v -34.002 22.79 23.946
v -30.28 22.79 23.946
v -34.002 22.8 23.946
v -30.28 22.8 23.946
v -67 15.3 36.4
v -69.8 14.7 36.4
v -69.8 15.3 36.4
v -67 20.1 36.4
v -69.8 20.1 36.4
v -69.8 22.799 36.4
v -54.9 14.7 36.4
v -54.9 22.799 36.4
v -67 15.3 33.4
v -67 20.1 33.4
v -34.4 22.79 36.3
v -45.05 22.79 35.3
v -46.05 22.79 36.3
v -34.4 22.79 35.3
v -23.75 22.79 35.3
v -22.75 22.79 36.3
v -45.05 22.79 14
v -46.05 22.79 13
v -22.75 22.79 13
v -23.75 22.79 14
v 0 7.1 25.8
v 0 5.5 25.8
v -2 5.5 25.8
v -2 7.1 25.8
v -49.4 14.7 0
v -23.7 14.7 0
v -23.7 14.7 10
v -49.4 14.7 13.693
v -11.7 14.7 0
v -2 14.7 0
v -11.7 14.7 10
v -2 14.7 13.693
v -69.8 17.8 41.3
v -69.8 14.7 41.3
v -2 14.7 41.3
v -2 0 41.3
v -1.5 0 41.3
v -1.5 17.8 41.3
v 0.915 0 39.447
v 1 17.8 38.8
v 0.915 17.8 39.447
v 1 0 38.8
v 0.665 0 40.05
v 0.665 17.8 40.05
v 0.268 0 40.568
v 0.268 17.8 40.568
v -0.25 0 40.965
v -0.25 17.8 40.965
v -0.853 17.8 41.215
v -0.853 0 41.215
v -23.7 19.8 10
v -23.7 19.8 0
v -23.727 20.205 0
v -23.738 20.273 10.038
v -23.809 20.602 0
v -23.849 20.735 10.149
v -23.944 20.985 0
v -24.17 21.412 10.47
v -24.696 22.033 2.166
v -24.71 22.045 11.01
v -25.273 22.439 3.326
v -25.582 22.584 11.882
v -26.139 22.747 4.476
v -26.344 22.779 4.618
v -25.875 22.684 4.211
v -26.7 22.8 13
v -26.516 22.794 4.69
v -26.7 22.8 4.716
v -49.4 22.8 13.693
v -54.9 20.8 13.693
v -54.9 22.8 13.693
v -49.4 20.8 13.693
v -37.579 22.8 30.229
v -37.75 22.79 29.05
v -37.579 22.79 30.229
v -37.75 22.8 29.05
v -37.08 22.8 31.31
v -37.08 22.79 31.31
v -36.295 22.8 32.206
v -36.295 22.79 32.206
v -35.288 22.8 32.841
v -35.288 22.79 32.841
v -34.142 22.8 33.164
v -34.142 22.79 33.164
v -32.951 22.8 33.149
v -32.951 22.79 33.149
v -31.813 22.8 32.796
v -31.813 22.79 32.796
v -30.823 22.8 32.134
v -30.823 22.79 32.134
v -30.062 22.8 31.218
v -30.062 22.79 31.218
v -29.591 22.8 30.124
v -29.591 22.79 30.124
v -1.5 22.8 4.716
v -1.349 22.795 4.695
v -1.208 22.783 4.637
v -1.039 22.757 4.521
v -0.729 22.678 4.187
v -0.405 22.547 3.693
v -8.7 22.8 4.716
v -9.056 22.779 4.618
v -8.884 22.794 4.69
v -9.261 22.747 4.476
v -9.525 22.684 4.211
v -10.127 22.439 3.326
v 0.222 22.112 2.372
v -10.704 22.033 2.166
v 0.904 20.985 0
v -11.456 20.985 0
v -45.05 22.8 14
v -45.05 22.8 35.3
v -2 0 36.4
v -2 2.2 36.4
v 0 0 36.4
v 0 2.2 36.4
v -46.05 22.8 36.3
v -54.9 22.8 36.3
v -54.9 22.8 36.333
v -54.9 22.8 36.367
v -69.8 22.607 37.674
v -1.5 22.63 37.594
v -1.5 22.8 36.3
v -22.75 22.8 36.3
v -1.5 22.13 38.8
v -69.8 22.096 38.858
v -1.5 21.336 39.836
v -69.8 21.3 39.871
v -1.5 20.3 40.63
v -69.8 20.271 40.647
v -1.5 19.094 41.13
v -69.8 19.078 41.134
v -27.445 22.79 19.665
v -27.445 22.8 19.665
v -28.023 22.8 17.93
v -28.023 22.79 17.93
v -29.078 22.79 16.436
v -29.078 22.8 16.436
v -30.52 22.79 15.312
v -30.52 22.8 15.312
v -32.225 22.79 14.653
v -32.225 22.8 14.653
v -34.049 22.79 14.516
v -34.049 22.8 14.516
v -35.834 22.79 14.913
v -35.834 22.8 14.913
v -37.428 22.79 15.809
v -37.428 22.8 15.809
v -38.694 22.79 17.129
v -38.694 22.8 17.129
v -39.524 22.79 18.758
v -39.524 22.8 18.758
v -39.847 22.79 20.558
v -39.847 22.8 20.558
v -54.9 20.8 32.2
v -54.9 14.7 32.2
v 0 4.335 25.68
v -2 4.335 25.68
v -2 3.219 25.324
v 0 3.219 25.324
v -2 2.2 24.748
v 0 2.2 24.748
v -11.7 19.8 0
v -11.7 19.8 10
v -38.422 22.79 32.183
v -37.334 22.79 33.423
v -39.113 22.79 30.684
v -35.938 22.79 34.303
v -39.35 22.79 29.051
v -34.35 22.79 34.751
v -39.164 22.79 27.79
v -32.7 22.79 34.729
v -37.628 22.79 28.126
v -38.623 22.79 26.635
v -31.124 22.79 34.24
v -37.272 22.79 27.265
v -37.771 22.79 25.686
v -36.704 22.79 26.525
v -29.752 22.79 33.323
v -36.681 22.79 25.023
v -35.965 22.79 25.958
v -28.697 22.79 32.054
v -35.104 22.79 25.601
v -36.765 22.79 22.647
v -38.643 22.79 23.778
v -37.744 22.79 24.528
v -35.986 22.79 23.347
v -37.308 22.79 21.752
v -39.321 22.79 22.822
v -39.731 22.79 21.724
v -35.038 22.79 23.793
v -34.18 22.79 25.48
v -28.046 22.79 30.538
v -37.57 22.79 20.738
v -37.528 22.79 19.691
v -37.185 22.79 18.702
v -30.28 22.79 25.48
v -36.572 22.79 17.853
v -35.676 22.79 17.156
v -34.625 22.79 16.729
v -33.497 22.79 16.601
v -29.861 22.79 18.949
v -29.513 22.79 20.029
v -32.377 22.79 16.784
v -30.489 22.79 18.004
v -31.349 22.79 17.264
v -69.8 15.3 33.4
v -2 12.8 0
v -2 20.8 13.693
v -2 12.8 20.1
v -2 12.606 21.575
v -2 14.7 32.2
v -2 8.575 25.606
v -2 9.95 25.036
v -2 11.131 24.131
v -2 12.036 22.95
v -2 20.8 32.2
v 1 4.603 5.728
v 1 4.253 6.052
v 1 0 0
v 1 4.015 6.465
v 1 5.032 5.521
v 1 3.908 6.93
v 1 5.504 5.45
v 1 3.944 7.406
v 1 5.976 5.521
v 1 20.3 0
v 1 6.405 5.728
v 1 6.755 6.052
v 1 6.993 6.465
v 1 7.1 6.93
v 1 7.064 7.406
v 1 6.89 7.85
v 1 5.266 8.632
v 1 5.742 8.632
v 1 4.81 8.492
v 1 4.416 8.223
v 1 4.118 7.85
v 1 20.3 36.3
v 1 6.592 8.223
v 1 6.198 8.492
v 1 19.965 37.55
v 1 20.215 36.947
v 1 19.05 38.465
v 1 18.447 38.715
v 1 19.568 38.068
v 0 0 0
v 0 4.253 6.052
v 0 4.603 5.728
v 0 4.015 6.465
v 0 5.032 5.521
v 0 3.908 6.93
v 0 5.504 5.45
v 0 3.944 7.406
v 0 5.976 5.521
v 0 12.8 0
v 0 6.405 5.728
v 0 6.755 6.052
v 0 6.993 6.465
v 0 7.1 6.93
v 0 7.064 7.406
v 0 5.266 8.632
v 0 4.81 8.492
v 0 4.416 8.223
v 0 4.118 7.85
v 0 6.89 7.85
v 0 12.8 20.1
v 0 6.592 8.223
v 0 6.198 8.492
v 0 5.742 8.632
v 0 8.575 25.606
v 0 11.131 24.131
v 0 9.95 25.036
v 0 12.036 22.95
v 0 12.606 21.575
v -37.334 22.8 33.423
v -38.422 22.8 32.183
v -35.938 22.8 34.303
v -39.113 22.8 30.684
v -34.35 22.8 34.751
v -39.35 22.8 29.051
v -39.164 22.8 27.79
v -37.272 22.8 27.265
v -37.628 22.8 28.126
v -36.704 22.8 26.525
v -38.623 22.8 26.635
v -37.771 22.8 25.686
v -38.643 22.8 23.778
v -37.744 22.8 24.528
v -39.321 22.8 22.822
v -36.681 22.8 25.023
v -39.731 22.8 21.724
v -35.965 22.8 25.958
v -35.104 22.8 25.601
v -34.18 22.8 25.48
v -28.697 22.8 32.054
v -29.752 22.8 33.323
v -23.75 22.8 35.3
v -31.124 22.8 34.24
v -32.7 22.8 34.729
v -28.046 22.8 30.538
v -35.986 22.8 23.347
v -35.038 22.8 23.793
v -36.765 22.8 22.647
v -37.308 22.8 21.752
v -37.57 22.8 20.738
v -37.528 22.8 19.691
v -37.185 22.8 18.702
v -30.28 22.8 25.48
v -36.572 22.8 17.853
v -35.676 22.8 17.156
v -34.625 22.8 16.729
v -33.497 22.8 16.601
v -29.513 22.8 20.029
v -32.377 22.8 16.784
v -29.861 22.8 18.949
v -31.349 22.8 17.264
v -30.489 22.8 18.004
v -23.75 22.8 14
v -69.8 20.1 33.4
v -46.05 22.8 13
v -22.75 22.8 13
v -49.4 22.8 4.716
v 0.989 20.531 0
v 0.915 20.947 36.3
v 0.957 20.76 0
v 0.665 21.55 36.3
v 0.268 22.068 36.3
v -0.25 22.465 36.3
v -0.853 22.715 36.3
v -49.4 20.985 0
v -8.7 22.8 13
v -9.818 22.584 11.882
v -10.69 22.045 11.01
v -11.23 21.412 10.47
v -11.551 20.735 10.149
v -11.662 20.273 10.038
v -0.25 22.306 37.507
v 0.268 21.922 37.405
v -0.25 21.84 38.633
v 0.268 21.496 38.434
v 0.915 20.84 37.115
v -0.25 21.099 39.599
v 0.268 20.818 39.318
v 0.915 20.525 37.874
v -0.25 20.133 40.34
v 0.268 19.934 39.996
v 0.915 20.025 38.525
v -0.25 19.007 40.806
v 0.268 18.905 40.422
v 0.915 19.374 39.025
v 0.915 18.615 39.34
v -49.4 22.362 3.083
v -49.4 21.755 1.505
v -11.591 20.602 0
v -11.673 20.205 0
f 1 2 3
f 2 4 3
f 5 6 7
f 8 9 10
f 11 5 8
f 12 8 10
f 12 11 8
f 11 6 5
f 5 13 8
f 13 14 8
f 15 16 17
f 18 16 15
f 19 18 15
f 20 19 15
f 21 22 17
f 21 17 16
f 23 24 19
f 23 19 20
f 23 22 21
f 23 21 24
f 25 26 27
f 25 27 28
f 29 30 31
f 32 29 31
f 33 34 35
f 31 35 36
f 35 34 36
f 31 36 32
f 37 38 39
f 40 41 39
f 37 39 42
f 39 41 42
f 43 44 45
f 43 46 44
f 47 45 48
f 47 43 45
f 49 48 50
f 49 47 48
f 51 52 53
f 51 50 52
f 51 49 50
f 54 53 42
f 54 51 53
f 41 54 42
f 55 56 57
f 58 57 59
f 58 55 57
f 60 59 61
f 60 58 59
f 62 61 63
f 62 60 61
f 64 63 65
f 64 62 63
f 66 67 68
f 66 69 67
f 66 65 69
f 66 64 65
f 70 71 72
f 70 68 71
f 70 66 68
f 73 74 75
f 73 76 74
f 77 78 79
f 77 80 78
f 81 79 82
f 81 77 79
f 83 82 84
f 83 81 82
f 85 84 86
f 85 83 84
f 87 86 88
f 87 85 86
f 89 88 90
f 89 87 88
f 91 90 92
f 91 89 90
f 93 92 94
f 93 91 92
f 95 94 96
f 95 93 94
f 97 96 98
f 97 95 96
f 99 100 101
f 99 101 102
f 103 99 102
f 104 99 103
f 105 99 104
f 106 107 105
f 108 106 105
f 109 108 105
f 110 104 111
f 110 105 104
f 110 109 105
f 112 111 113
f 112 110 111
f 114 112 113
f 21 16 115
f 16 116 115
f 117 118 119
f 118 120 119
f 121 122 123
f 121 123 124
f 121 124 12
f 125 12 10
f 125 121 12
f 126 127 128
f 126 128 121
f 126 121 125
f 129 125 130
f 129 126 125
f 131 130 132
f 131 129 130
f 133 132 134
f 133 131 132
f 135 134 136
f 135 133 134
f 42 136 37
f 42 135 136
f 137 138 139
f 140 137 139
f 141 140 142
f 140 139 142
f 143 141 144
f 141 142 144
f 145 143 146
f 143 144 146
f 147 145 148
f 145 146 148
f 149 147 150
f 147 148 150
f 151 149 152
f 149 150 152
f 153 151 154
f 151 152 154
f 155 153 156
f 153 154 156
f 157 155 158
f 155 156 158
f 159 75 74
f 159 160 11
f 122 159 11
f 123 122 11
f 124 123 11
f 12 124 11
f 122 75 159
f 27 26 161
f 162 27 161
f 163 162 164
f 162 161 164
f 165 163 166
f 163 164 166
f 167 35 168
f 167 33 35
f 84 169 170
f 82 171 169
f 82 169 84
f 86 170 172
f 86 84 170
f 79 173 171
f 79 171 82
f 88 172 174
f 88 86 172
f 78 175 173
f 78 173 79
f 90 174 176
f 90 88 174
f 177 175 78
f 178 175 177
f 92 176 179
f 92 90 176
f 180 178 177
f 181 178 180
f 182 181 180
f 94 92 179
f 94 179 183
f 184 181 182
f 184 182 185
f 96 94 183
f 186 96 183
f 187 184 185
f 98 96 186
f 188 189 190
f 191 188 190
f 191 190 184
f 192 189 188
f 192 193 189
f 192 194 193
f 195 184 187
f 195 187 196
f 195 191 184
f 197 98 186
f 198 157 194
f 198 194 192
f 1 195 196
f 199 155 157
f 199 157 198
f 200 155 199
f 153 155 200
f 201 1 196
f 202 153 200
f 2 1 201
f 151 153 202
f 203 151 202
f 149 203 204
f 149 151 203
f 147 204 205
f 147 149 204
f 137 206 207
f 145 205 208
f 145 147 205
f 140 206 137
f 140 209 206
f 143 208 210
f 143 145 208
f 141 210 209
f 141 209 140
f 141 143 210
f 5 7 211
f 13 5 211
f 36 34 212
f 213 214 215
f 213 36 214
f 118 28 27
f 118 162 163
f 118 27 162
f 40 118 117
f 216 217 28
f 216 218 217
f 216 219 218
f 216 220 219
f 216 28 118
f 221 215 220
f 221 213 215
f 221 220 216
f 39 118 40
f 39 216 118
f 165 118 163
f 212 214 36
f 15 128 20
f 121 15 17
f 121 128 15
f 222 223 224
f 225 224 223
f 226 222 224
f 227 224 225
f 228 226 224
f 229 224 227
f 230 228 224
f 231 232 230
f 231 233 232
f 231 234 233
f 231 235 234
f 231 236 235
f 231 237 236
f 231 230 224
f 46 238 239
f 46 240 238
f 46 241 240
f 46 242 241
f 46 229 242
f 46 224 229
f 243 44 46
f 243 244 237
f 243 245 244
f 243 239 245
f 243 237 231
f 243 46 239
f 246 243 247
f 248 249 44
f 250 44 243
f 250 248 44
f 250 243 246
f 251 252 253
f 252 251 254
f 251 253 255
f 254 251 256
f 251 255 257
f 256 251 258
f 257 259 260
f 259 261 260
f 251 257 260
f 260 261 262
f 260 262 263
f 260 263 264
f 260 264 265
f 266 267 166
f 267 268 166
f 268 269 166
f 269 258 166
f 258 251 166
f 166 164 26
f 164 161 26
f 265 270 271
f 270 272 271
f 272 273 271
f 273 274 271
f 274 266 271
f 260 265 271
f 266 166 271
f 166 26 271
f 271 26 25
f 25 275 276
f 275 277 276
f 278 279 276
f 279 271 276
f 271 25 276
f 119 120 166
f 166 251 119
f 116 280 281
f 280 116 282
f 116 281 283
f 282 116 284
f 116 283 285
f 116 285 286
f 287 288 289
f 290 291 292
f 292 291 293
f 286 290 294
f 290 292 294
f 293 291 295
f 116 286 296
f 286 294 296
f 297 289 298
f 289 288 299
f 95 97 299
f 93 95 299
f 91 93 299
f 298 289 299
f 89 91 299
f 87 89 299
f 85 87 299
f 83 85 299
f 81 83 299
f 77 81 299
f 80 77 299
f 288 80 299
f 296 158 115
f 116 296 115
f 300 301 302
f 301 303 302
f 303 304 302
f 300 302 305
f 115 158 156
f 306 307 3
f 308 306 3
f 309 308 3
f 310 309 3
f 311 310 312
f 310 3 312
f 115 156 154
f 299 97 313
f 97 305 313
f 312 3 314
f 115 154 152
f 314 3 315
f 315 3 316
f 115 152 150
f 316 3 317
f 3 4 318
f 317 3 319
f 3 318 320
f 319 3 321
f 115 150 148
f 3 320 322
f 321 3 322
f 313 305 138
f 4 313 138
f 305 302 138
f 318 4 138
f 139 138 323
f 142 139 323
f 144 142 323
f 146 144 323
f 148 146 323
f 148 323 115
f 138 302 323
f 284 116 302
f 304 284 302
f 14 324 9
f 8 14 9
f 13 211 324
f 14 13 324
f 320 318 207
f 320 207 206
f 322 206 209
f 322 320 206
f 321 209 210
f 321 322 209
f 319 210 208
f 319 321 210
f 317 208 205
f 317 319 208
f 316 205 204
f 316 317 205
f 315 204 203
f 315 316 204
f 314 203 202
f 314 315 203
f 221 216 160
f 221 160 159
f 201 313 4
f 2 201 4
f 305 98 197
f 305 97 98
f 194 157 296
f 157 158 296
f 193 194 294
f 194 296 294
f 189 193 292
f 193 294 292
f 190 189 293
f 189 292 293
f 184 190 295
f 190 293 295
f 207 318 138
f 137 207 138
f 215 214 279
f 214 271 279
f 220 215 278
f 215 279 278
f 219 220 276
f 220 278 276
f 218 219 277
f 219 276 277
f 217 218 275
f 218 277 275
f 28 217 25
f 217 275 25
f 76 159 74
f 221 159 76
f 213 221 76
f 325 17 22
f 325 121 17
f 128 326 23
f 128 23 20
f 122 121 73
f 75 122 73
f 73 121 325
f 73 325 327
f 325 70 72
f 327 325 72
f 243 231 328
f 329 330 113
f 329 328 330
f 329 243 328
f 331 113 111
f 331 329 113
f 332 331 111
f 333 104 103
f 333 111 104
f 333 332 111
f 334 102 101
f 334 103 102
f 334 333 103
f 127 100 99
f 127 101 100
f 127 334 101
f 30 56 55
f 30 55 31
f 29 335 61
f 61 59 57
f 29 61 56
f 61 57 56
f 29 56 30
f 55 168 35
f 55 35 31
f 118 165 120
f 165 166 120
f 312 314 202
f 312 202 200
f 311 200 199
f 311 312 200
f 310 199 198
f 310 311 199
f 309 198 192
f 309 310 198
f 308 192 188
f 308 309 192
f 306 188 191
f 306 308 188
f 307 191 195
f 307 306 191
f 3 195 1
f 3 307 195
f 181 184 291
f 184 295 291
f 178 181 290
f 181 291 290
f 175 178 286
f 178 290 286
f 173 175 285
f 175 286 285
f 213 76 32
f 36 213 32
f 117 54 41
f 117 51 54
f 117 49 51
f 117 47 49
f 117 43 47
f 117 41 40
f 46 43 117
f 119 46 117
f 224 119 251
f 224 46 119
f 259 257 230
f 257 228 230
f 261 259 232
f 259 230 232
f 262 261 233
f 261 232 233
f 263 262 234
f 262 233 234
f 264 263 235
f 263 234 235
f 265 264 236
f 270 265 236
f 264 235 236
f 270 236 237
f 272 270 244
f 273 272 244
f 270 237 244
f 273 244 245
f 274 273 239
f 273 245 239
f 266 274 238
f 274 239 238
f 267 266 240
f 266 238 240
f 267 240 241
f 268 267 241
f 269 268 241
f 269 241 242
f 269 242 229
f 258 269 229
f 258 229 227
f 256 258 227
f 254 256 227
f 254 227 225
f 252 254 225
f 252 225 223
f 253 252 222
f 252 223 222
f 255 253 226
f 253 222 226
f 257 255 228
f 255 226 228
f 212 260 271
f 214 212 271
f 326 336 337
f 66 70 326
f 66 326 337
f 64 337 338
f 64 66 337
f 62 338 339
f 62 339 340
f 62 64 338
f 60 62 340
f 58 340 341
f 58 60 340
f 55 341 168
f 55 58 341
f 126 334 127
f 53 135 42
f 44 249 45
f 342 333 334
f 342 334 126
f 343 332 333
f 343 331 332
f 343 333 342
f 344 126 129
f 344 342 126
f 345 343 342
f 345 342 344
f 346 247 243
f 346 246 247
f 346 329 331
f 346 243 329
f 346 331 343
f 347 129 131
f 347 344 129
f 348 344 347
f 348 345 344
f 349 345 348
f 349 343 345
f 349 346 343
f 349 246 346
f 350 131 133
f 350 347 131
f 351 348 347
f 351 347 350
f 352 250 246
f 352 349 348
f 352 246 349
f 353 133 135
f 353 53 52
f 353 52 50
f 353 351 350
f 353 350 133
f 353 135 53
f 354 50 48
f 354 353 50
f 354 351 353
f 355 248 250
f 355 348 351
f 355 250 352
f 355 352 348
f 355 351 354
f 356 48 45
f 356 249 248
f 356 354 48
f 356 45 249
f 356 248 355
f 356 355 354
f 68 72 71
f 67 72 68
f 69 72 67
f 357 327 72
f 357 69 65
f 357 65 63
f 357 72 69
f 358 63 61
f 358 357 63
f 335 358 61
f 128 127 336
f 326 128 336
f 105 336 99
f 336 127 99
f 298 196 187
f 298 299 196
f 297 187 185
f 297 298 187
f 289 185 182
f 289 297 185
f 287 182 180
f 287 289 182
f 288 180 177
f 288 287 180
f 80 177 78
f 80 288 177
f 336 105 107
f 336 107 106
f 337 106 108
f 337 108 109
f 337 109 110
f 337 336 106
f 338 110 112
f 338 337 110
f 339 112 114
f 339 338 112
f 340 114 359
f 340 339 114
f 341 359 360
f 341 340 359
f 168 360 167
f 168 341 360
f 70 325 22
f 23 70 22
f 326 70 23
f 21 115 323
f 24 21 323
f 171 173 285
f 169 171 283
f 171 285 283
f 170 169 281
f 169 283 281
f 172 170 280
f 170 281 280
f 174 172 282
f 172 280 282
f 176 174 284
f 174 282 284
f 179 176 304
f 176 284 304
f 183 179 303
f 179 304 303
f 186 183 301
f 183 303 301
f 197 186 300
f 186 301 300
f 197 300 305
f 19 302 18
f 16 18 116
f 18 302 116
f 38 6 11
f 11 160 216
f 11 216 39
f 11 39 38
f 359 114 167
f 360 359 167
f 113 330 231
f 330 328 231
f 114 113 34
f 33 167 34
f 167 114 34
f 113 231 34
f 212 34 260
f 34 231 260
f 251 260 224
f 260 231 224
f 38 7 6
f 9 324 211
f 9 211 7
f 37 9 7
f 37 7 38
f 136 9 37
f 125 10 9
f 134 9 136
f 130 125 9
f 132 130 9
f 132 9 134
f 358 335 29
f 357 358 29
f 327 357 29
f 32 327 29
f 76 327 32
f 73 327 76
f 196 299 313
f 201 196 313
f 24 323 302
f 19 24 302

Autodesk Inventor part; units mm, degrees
ref_plane "YZ Plane" through (0, 0, 0) normal (1, 0, 0) x (0, 1, 0)
sketch "スケッチ1" plane through (0, 0, 0) normal (1, 0, 0) x (0, 1, 0)
  line L0 (0, 0) -> (22.8, 0)
  line L1 (22.8, 0) -> (22.8, 41.3)
  line L2 (22.8, 41.3) -> (0, 41.3)
  line L3 (0, 41.3) -> (0, 0)
  arc A0 (2, -7.1682) -> (22.8, 4.7165) centre (7.1, 8.05) ccw projected
  line L4 (22.8, 36.2) -> (22.8, 4.7165) projected
  line L5 (22.8, 36.2) -> (12.6, 36.2) projected
  line L6 (12.6, 36.2) -> (12.6, 28.2) projected
  line L7 (14.2, 28.2) -> (12.6, 28.2) projected
  line L8 (14.2, 28.2) -> (14.2, 32.2) projected
  line L9 (14.2, 32.2) -> (20.8, 32.2) projected
  line L10 (20.8, 32.2) -> (20.8, 8.3) projected
  line L11 (14.2, 8.3) -> (20.8, 8.3) projected
  line L12 (14.2, 4.7954) -> (14.2, 8.3) projected
  line L13 (14.2, 0) -> (14.2, 4.7954) projected
  line L14 (2, 0) -> (14.2, 0) projected
  line L15 (2, 0) -> (2, -7.1682) projected
  line L16 (12.6, 42.3) -> (14.6, 42.3) projected
  dimension "d2" = 1
extrude "押し出し1" add sketch "スケッチ1" along normal blind 1 contours L3 L2 L1 L5 L6 L7 L8 L9 L10 L11 L12 L13 L0 | L13 L12 L11 L10 L9 L8 L7 L6 L5 L1 A0 L0 | A0 L1 L0
sketch "スケッチ2" plane through (0, 0, 0) normal (-1, 0, 0) x (0, 0, 1)
  line L0 (24.3426, 2) -> (36.2, 2)
  line L1 (36.2, 0) -> (36.2, 2)
  arc A0 (25.6, 7.1) -> (20.1, 12.6) centre (20.1, 7.1) ccw
  line L2 (25.6, 7.1) -> (25.6, 5.5)
  arc A1 (24.3426, 2) -> (25.6, 5.5) centre (20.1, 5.5) ccw
  line L3 (0, 12.6) -> (20.1, 12.6)
  line L4 (0, 22.8) -> (41.3, 22.8)
  line L5 (0, 0) -> (0, 22.8)
  line L6 (41.3, 0) -> (0, 0)
  line L7 (41.3, 22.8) -> (41.3, 0)
  line L8 (0, 12.8) -> (20.1, 12.8)
  arc A2 (25.8, 7.1) -> (20.1, 12.8) centre (20.1, 7.1) ccw
  arc A3 (24.7476, 2.2) -> (25.8, 5.5) centre (20.1, 5.5) ccw
  line L9 (25.8, 5.5) -> (25.8, 7.1)
  line L10 (24.7476, 2.2) -> (36.4, 2.2)
  line L11 (36.4, 2.2) -> (36.4, 0)
  line L12 (41.3, 0) -> (0, 0)
  line L13 (0, 0) -> (0, 22.8)
extrude "押し出し2" add sketch "スケッチ2" along normal blind 2 contours L11 L10 A3 L9 A2 L8 L5 L4 L7 L6
sketch "スケッチ3" plane through (-2, 0, 0) normal (-1, 0, 0) x (0, 0, 1)
  line L0 (28.2, 12.6) -> (50.1, 12.6) projected
  line L1 (0, 14.2) -> (4.55, 14.2) projected
  line L2 (41.3, 0) -> (41.3, 22.8) projected
  line L3 (41.3, 22.8) -> (0, 22.8) projected
  line L4 (0, 22.8) -> (0, 12.8) projected
  line L5 (0, 12.8) -> (20.1, 12.8) projected
  arc A0 (25.8, 7.1) -> (20.1, 12.8) centre (20.1, 7.1) ccw projected
  line L6 (25.8, 7.1) -> (25.8, 5.5) projected
  arc A1 (24.7476, 2.2) -> (25.8, 5.5) centre (20.1, 5.5) ccw projected
  line L7 (24.7476, 2.2) -> (36.4, 2.2) projected
  line L8 (36.4, 2.2) -> (36.4, 0) projected
  line L9 (36.4, 0) -> (41.3, 0) projected
  line L10 (41.3, 0) -> (41.3, 22.8) projected
  line L11 (0, 14.7) -> (41.3, 14.7)
  point P0 (0, 0)
  dimension "d9" = 0.5
extrude "押し出し3" add sketch "スケッチ3" along normal blind 47.4 contours L11 L4 L3 L2
sketch "スケッチ4" plane through (-49.4, 0, 0) normal (-1, 0, 0) x (0, 0, 1)
  line L0 (11.075, 12.3395) -> (13.693, 16.874) projected
  line L1 (13.693, 16.874) -> (13.693, 22.8)
  line L2 (41.3, 22.8) -> (0, 22.8) projected
  line L3 (0, 22.8) -> (0, 14.7) projected
  line L4 (0, 14.7) -> (41.3, 14.7) projected
  line L5 (41.3, 14.7) -> (41.3, 22.8) projected
  line L6 (41.3, 22.8) -> (0, 22.8) projected
  arc A0 (4.7165, 22.8) -> (-7.1682, 2) centre (8.05, 7.1) ccw projected
  line L7 (36.2, 22.8) -> (4.7165, 22.8) projected
  line L8 (36.2, 22.8) -> (36.2, 12.6) projected
  line L9 (36.2, 12.6) -> (28.2, 12.6) projected
  line L10 (28.2, 14.2) -> (28.2, 12.6) projected
  line L11 (28.2, 14.2) -> (32.2, 14.2) projected
  line L12 (32.2, 14.2) -> (32.2, 20.8) projected
  line L13 (32.2, 20.8) -> (8.3, 20.8) projected
  line L14 (8.3, 14.2) -> (8.3, 20.8) projected
  line L15 (4.7954, 14.2) -> (8.3, 14.2) projected
  line L16 (0, 14.2) -> (4.7954, 14.2) projected
  line L17 (0, 2) -> (0, 14.2) projected
  line L18 (0, 2) -> (-7.1682, 2) projected
  point P0 (0, 0)
  point P1 (13.693, 20.8)
  point P2 (32.2, 14.7)
ref_plane "作業平面1" through (-54.9, 2, -8) normal (1, 0, 0) x (0, 1, 0)
extrude "押し出し4" add sketch "スケッチ4" along normal up to surface (5.5 mm away) contours L12 L13 L1 L2 L8 L4 | L8 L2 L5 L4
sketch "スケッチ5" plane through (-54.9, 14.7, 41.3) normal (-1, 0, 0) x (0, 0, 1)
  line L0 (-27.607, 6.1) -> (-9.1, 6.1) projected
  line L1 (-9.1, 6.1) -> (-9.1, 0) projected
  line L2 (-9.1, 0) -> (0, 0) projected
  line L3 (0, 0) -> (0, 8.1) projected
  line L4 (0, 8.1) -> (-27.607, 8.1) projected
  line L5 (-27.607, 8.1) -> (-27.607, 6.1) projected
  line L6 (-5.1, -12.7) -> (-5.1, 0.5) projected
  line L7 (0, 0) -> (-41.3, 0) projected
  line L8 (-4.9, 0) -> (-4.9, 8.1)
  point P0 (-41.3, -14.7)
  point P1 (-4.9, 0)
  dimension "d14" = 0.2
ref_plane "作業平面2" through (-69.8, 2, -8) normal (-1, 0, 0) x (0, 0, 1)
extrude "押し出し5" add sketch "スケッチ5" along normal up to surface (14.9 mm away) contours L4 L3 L2 L8
sketch "スケッチ6" plane through (-49.4, 0, 0) normal (-1, 0, 0) x (0, 0, 1)
  line L0 (13.693, 20.8) -> (13.693, 22.8) projected
  line L1 (13.693, 22.8) -> (0, 22.8) projected
  line L2 (0, 22.8) -> (0, 14.7) projected
  line L3 (0, 14.7) -> (32.2, 14.7) projected
  line L4 (32.2, 14.7) -> (32.2, 20.8) projected
  line L5 (32.2, 20.8) -> (13.693, 20.8) projected
  line L6 (13.693, 20.8) -> (13.693, 14.7)
  point P0 (0, 0)
extrude "押し出し6" cut sketch "スケッチ6" against normal up to surface (47.4 mm away) contours L5 L4 L3 L6
fillet "フィレット1" radius 5 1 edges at (-34.4, 22.8, 41.3)
fillet "フィレット2" radius 2.5 3 edges at (1, 22.8, 18.15) (1, 21.3355, 39.8355) (1, 8.9, 41.3)
sketch "スケッチ7" plane through (-49.4, 0, 0) normal (-1, 0, 0) x (0, 0, 1)
  arc A0 (4.7165, 22.8) -> (-7.1682, 2) centre (8.05, 7.1) ccw projected
  line L0 (13.693, 22.8) -> (0, 22.8) projected
  arc A1 (4.7165, 22.8) -> (-7.1682, 2) centre (8.05, 7.1) ccw projected
  line L1 (0, 22.8) -> (0, 14.7) projected
  point P0 (0, 0)
  point P1 (0, 20.9852)
extrude "押し出し7" cut sketch "スケッチ7" against normal through all
sketch "スケッチ8" plane through (0, 0, 0) normal (0, 0, -1) x (-1, 0, 0)
  line L0 (23.7, 13.1) -> (23.7, 1.1) projected
  line L1 (2, 14.7) -> (49.4, 14.7) projected
  line L2 (1.5, 22.8) -> (49.4, 22.8) projected
  line L3 (2, 14.7) -> (69.8, 14.7) projected
  line L4 (23.7, 14.7) -> (11.7, 14.7)
  line L5 (11.7, 14.7) -> (11.7, 22.8)
  line L6 (11.7, 22.8) -> (23.7, 22.8)
  line L7 (23.7, 22.8) -> (23.7, 14.7)
  point P0 (0, 0)
  point P1 (11.7, 14.7)
  dimension "d23" = 12
extrude "押し出し8" cut sketch "スケッチ8" against normal blind 10
fillet "フィレット3" radius 3 3 edges at (-23.7, 22.8, 7.3582) (-11.7, 22.8, 7.3582) (-17.7, 22.8, 10)
sketch "スケッチ9" plane through (-69.8, 14.7, 36.4) normal (-1, 0, 0) x (0, 0, 1)
  line L0 (-0.2, 0.5) -> (-3.2, 0.5) projected
  line L1 (-0.2, 5.5) -> (-0.2, 0.5) projected
  line L2 (-3.2, 5.5) -> (-0.2, 5.5) projected
  line L3 (-3.2, 0.5) -> (-3.2, 5.5) projected
  line L4 (-3, 5.4) -> (0, 5.4)
  line L5 (0, 5.4) -> (0, 0.6)
  line L6 (0, 0.6) -> (-3, 0.6)
  line L7 (-3, 0.6) -> (-3, 5.4)
  arc A0 (4.9, 3.1) -> (0, 8.099) centre (-0.1, 3.1) ccw projected
  line L8 (0, 0) -> (0, 8.099) projected
  line L9 (4.9, 0) -> (0, 0) projected
  line L10 (4.9, 3.1) -> (4.9, 0) projected
  line L11 (0, 0) -> (0, 8.099) projected
  point P0 (-36.4, -14.7)
  point P1 (-0.2, 3)
  point P2 (-3, 3)
  dimension "d27" = 4.8
extrude "押し出し9" add sketch "スケッチ9" against normal blind 2.8 contours L6 L7 L4 L1 | L1 L4 L5 L6
sketch "スケッチ10" plane through (1, 0, 0) normal (1, 0, 0) x (0, 0, -1)
  circle A0 centre (-7.05, 5.504) radius 1.6
  arc A1 (-4.65, 5.508) -> (-6.95, 8) centre (-7.15, 5.508) ccw projected
  arc A2 (-6.95, 8) -> (-9.45, 5.5) centre (-6.95, 5.5) ccw projected
  line L0 (-7.15, 5.508) -> (-6.95, 5.5)
  point P0 (0, 0)
  dimension "d30" = 3.2
extrude "押し出し10" cut sketch "スケッチ10" against normal through all
sketch "スケッチ11" plane through (-54.9, 22.8, 13.693) normal (0, 1, 0) x (1, 0, 0)
  line L0 (53.4, -22.607) -> (0, -22.607) projected
  line L1 (32.15, -22.607) -> (8.85, -22.607)
  line L2 (8.85, -22.607) -> (8.85, 0.693)
  line L3 (8.85, 0.693) -> (32.15, 0.693)
  line L4 (32.15, 0.693) -> (32.15, -22.607)
  line L5 (28.2, 0.693) -> (46.2, 0.693) projected
  line L6 (20.5, -22.607) -> (20.5, -17.7274)
  line L7 (55.9, -22.607) -> (55.9, 13.693) projected
  line L8 (-14.9, -27.607) -> (-14.9, -22.707) projected
  line L9 (55.9, -22.607) -> (55.9, 7.9184)
  line L10 (-14.9, -27.607) -> (-14.9, -22.707) projected
  line L11 (-14.9, -27.607) -> (-14.9, -22.707)
  line L12 (10.35, -0.807) -> (30.65, -0.807)
  line L13 (30.65, -0.807) -> (30.65, -21.107)
  line L14 (30.65, -21.107) -> (10.35, -21.107)
  line L15 (10.35, -21.107) -> (10.35, -0.807)
  line L16 (9.85, -0.307) -> (31.15, -0.307)
  line L17 (31.15, -0.307) -> (31.15, -21.607)
  line L18 (31.15, -21.607) -> (9.85, -21.607)
  line L19 (9.85, -21.607) -> (9.85, -0.307)
  line L20 (-14.2639, 8.2606) -> (-10.5139, 8.2606)
  circle A0 centre (21.3, -7.057) radius 6.25
  circle A1 centre (21.3, -15.357) radius 5.75
  circle A2 centre (21.3, -7.057) radius 4.15
  circle A3 centre (21.3, -15.357) radius 4.15
  line L21 (24.6204, -10.2528) -> (18.6525, -10.2528)
  line L22 (18.6525, -10.2528) -> (18.6525, -11.7867)
  line L23 (18.6525, -11.7867) -> (24.6204, -11.7867)
  line L24 (24.6204, -11.7867) -> (24.6204, -10.2528)
  arc A4 (15.053, -6.8649) -> (21.3, -11.207) centre (19.5885, -7.0044) ccw
  arc A5 (21.3, -11.207) -> (15.55, -15.3584) centre (19.9229, -15.3573) ccw
  arc A6 (20.7203, -11.7867) -> (17.15, -15.357) centre (20.7203, -15.357) ccw
  arc A7 (18.3285, -4.16) -> (20.8976, -10.2528) centre (20.8976, -6.6647) ccw
  line L25 (21.3, -15.357) -> (26.8541, -16.8452)
  line L26 (21.3, -7.057) -> (27.455, -5.9717)
  point P0 (54.9, 13.693)
  point P1 (20.5, 14.3955)
  point P2 (30.65, -10.957)
  point P3 (31.15, -10.957)
  point P4 (20.5, -0.807)
  point P5 (20.5, -0.307)
  point P6 (20.5, 3.8955)
  point P7 (18.6525, -11.0197)
  point P8 (32.15, -10.957)
  point P9 (20.5, -21.607)
  point P10 (25.387, -6.3363)
  point P11 (18.2184, -11.3303)
  point P12 (25.3086, -16.4311)
  point P13 (8.85, -22.607)
  dimension "d33" = 35.4
  dimension "d34" = 35.4
  dimension "d35" = 23.3
  dimension "d36" = 23.3
  dimension "d40" = 0.5
  dimension "d49" = 1
  dimension "d51" = 11.5
  dimension "d52" = 12.5
  dimension "d53" = 0.8
  dimension "d54" = 80
  dimension "d55" = 75
extrude "押し出し11" cut sketch "スケッチ11" against normal blind 0.01 contours L0 L2 L3 L4 | A1 A5 A0 A3 L6 | L6 A3 L25 A1 | A3 A0 A6 | A5 A4 L22 L23 A3 A0 | A0 L26 A2 A1 A4 | A3 L23 A6 A0 | A1 L22 A5 A4 | A5 L22 A4 | L23 L22 A4 A3 | A3 A4 L23 | A2 A7 A1 | L21 A2 A5 | A1 A7 L21 | A2 A5 L22 | L22 A5 A2 A3 A4 | L24 L23 A3 A2 A1 | A1 L21 L24 | A3 A4 | A5 A2 picked at (17.7249, -13.3851) picked at (19.4043, -11.9435) picked at (18.4353, -9.7598) picked at (19.6416, -10.192)
equation "\"d33\" = d34"
equation "\"d36\" = d35"
equation "\"d4\" = d3"
equation "\"d5\" = d4"
equation "\"d6\" = d5"
equation "\"d3\" = 0.2"
properties part number "hand_finger_cover_3"
